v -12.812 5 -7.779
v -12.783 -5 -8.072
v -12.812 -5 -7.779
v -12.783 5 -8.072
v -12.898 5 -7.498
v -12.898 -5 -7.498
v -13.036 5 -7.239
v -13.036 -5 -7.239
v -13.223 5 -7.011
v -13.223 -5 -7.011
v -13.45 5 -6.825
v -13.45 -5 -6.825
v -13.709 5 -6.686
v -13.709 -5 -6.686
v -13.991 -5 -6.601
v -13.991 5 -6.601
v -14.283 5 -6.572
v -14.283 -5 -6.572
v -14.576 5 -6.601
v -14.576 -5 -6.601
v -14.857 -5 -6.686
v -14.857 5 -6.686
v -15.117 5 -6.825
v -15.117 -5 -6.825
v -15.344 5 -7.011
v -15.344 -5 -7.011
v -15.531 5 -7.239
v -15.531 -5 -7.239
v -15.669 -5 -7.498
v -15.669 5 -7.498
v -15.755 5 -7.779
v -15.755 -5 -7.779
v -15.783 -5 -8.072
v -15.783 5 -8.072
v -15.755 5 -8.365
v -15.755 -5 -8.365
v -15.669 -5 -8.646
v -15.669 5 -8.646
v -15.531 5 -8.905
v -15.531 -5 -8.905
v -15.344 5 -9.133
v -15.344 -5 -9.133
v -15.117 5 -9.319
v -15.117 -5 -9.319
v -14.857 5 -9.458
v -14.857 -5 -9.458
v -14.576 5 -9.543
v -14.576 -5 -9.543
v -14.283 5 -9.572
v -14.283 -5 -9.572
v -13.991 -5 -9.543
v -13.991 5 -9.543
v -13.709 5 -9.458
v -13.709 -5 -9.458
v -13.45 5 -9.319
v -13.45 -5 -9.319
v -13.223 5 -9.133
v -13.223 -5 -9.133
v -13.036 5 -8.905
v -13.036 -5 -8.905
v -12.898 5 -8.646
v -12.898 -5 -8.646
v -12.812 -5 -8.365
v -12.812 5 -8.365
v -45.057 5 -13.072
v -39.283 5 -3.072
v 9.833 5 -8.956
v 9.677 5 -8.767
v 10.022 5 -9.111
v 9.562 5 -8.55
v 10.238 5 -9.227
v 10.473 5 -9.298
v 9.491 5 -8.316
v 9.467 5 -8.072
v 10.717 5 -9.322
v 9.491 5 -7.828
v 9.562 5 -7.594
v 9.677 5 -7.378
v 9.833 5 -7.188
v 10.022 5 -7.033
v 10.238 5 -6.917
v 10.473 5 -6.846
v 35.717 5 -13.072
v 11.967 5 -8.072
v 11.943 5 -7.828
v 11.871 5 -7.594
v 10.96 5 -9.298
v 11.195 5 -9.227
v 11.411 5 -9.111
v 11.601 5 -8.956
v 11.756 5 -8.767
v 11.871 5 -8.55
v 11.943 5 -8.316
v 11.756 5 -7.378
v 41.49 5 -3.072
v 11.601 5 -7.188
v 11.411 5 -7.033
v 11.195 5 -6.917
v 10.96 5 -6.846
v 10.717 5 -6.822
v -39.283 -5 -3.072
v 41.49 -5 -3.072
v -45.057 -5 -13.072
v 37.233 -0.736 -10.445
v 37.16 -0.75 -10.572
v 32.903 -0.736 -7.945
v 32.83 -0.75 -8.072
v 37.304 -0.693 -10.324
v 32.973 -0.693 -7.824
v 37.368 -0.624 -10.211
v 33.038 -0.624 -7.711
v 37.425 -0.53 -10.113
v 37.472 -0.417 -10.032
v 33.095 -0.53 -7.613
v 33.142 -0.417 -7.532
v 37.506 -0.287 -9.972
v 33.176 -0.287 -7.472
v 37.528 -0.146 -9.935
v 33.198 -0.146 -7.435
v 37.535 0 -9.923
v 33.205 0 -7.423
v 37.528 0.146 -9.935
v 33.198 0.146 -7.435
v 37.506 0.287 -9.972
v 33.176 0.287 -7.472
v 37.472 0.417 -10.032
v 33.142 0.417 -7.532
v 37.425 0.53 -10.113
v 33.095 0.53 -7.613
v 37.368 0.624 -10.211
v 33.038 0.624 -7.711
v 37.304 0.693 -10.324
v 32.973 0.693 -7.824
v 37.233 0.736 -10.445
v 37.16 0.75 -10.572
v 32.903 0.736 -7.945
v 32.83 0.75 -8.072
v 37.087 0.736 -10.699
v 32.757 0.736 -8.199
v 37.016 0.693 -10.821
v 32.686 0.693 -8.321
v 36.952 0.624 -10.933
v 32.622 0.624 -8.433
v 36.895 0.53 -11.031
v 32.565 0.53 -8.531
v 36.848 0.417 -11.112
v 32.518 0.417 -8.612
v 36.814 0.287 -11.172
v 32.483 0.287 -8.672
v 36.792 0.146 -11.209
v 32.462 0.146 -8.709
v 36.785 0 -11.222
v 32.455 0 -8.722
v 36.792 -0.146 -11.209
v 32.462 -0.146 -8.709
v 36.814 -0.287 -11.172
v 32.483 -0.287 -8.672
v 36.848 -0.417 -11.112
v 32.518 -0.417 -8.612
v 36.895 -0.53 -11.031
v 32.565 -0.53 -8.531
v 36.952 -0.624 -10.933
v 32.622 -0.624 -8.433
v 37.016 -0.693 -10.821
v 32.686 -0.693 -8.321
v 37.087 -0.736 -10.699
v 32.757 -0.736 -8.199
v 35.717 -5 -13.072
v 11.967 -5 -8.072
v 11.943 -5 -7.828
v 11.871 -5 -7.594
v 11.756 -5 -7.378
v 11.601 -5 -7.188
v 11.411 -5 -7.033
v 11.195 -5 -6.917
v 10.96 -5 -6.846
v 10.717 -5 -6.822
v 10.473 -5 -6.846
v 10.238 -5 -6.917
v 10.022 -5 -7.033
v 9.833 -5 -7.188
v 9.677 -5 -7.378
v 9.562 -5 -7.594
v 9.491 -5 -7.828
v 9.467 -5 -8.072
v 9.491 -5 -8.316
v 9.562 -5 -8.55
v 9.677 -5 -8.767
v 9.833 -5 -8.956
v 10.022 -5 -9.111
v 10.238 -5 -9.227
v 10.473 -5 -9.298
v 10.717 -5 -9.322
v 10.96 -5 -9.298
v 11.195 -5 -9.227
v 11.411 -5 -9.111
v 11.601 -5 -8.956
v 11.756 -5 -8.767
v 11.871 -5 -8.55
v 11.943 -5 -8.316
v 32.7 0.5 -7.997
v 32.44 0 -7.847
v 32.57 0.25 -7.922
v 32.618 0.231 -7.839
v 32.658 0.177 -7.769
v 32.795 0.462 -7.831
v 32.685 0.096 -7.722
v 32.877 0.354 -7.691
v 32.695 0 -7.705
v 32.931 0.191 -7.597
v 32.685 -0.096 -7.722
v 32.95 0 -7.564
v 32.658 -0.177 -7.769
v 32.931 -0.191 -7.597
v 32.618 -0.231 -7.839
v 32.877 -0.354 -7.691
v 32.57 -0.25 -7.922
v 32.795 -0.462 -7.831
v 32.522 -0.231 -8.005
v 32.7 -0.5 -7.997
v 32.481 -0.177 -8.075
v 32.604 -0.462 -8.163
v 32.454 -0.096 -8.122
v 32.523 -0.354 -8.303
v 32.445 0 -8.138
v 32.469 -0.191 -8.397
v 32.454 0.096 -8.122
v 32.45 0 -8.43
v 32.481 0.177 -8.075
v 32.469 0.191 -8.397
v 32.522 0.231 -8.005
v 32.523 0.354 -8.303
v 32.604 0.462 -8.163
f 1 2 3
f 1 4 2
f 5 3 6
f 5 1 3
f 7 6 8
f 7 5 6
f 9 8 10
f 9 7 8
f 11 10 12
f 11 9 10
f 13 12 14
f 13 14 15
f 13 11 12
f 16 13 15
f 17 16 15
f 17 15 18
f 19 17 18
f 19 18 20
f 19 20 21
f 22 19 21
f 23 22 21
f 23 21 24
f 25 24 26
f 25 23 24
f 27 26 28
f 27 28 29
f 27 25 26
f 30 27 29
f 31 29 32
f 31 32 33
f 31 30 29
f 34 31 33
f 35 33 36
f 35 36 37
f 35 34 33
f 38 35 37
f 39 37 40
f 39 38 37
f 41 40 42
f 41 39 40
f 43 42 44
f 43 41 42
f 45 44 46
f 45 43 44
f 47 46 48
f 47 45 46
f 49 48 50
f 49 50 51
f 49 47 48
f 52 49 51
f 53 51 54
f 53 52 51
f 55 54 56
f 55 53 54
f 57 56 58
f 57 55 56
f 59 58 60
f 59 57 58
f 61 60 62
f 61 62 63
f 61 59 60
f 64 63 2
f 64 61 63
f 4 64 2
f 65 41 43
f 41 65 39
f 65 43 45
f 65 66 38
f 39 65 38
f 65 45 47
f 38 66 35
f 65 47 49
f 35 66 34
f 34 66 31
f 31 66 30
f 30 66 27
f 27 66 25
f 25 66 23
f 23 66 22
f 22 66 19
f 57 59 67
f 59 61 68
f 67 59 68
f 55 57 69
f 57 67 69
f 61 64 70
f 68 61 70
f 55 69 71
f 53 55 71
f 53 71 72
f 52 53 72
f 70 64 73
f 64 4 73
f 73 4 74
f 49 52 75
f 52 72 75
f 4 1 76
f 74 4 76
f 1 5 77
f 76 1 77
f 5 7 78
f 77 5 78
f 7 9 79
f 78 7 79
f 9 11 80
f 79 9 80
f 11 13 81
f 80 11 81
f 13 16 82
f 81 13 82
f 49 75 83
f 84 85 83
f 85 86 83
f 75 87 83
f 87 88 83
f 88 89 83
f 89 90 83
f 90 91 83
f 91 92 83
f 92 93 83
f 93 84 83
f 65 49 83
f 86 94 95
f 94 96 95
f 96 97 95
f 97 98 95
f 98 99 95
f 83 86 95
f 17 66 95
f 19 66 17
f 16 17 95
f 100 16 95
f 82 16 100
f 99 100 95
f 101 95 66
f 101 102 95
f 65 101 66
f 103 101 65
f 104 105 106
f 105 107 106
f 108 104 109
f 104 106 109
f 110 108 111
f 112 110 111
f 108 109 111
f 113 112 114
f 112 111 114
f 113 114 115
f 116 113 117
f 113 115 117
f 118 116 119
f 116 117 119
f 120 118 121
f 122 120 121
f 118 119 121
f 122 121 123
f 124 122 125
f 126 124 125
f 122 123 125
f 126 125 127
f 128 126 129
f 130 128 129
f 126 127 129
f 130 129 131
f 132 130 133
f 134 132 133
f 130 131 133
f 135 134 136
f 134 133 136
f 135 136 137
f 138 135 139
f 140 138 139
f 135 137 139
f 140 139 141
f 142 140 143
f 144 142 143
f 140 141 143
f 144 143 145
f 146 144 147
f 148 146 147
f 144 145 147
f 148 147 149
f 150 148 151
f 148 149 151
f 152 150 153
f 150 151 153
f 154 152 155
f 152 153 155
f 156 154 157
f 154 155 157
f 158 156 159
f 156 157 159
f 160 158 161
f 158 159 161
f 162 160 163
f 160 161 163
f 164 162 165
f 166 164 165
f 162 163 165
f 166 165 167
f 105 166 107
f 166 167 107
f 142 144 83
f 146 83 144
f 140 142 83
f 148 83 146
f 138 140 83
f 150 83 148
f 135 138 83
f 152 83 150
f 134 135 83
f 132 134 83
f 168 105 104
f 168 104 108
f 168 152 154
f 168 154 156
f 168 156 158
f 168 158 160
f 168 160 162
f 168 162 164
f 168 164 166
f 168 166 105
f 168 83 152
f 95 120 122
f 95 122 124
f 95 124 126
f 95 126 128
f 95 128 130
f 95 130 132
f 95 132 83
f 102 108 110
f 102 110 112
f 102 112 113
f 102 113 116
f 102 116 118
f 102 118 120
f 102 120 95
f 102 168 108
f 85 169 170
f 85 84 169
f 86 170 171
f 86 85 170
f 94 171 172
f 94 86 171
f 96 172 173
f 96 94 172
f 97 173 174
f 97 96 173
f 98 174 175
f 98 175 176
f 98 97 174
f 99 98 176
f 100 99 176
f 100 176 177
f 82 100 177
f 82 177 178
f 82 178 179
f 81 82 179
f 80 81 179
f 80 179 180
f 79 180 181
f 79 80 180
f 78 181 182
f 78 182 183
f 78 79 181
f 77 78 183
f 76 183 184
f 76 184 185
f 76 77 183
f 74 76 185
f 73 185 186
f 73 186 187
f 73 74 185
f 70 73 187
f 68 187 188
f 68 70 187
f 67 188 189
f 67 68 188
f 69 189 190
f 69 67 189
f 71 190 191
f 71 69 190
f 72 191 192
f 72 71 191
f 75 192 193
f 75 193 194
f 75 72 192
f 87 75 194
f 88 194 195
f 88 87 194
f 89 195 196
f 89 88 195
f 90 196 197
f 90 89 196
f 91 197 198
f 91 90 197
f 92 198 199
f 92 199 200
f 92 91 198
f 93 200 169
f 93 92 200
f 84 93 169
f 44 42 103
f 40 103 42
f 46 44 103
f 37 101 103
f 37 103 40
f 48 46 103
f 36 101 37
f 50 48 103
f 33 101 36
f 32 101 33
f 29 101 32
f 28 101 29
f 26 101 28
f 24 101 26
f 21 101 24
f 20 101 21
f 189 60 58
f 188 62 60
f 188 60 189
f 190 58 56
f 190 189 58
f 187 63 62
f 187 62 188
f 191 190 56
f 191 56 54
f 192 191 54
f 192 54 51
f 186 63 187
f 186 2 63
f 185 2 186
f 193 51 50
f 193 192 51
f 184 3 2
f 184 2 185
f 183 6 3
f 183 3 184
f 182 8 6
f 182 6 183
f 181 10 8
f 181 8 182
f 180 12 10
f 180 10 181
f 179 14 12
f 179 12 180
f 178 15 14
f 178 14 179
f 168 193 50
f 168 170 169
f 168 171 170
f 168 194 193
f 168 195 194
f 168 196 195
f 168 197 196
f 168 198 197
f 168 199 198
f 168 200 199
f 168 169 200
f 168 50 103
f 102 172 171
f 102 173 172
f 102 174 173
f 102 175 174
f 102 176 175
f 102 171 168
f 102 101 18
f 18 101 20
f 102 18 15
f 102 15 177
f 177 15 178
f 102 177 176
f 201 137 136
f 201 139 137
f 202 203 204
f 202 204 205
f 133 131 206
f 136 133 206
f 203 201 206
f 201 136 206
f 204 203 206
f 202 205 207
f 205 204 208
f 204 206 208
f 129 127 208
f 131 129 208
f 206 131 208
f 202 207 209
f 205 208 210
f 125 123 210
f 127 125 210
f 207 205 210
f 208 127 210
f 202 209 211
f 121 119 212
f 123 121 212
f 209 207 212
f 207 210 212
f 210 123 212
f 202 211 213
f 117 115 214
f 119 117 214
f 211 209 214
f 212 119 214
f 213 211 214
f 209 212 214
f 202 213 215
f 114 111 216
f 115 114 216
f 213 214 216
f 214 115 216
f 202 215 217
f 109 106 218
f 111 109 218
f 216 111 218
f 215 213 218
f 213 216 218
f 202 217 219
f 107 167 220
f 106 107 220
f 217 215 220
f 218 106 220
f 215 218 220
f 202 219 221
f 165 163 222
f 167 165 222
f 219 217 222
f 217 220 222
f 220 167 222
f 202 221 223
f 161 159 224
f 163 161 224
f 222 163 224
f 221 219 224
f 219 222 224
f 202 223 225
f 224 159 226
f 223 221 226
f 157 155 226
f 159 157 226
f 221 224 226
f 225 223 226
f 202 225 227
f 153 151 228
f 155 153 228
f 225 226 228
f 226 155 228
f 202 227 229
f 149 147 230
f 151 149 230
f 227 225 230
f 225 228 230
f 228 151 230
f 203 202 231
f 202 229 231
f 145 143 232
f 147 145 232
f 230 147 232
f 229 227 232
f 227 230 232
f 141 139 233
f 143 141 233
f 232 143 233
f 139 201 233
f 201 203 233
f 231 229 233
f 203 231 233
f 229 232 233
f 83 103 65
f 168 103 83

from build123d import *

# Parameters (mm, degrees)
F0_R     = 1.5
F0_R_2   = 1.25
F1_DEPTH = 5
F3_D     = 1.5
F3_DEPTH = 5
F3_TIP   = 0.4506454643


with BuildPart() as f1:
    # F0 (on Front) → F1 (new body, symmetric)
    with BuildSketch(Plane.XZ):
        Polygon((35.7166262344, -3.072109893), (-39.2833737656, -3.072109893), (-45.0568764575, -13.072109893), (-39.2833737656, -13.072109893), (35.7166262344, -13.072109893), (41.4901289262, -3.072109893), align=None)
        with Locations((-14.2833737656, -8.072109893)):
            Circle(F0_R, mode=Mode.SUBTRACT)
        with Locations((10.7166262344, -8.072109893)):
            Circle(F0_R_2, mode=Mode.SUBTRACT)
    extrude(amount=F1_DEPTH, both=True)

    # F3
    with Locations(Plane(origin=(32.4478592999, 0, -18.7337803015), x_dir=(0, 1, 0), z_dir=(0.8660254038, 0, -0.5))):
        with Locations((0, 9.4242852148)):
            Hole(F3_D / 2, depth=F3_DEPTH)
            with Locations((0, 0, -(F3_DEPTH + F3_TIP / 2))):  # 118° drill point
                Cone(0, F3_D / 2, F3_TIP, mode=Mode.SUBTRACT)


solid = f1.part
